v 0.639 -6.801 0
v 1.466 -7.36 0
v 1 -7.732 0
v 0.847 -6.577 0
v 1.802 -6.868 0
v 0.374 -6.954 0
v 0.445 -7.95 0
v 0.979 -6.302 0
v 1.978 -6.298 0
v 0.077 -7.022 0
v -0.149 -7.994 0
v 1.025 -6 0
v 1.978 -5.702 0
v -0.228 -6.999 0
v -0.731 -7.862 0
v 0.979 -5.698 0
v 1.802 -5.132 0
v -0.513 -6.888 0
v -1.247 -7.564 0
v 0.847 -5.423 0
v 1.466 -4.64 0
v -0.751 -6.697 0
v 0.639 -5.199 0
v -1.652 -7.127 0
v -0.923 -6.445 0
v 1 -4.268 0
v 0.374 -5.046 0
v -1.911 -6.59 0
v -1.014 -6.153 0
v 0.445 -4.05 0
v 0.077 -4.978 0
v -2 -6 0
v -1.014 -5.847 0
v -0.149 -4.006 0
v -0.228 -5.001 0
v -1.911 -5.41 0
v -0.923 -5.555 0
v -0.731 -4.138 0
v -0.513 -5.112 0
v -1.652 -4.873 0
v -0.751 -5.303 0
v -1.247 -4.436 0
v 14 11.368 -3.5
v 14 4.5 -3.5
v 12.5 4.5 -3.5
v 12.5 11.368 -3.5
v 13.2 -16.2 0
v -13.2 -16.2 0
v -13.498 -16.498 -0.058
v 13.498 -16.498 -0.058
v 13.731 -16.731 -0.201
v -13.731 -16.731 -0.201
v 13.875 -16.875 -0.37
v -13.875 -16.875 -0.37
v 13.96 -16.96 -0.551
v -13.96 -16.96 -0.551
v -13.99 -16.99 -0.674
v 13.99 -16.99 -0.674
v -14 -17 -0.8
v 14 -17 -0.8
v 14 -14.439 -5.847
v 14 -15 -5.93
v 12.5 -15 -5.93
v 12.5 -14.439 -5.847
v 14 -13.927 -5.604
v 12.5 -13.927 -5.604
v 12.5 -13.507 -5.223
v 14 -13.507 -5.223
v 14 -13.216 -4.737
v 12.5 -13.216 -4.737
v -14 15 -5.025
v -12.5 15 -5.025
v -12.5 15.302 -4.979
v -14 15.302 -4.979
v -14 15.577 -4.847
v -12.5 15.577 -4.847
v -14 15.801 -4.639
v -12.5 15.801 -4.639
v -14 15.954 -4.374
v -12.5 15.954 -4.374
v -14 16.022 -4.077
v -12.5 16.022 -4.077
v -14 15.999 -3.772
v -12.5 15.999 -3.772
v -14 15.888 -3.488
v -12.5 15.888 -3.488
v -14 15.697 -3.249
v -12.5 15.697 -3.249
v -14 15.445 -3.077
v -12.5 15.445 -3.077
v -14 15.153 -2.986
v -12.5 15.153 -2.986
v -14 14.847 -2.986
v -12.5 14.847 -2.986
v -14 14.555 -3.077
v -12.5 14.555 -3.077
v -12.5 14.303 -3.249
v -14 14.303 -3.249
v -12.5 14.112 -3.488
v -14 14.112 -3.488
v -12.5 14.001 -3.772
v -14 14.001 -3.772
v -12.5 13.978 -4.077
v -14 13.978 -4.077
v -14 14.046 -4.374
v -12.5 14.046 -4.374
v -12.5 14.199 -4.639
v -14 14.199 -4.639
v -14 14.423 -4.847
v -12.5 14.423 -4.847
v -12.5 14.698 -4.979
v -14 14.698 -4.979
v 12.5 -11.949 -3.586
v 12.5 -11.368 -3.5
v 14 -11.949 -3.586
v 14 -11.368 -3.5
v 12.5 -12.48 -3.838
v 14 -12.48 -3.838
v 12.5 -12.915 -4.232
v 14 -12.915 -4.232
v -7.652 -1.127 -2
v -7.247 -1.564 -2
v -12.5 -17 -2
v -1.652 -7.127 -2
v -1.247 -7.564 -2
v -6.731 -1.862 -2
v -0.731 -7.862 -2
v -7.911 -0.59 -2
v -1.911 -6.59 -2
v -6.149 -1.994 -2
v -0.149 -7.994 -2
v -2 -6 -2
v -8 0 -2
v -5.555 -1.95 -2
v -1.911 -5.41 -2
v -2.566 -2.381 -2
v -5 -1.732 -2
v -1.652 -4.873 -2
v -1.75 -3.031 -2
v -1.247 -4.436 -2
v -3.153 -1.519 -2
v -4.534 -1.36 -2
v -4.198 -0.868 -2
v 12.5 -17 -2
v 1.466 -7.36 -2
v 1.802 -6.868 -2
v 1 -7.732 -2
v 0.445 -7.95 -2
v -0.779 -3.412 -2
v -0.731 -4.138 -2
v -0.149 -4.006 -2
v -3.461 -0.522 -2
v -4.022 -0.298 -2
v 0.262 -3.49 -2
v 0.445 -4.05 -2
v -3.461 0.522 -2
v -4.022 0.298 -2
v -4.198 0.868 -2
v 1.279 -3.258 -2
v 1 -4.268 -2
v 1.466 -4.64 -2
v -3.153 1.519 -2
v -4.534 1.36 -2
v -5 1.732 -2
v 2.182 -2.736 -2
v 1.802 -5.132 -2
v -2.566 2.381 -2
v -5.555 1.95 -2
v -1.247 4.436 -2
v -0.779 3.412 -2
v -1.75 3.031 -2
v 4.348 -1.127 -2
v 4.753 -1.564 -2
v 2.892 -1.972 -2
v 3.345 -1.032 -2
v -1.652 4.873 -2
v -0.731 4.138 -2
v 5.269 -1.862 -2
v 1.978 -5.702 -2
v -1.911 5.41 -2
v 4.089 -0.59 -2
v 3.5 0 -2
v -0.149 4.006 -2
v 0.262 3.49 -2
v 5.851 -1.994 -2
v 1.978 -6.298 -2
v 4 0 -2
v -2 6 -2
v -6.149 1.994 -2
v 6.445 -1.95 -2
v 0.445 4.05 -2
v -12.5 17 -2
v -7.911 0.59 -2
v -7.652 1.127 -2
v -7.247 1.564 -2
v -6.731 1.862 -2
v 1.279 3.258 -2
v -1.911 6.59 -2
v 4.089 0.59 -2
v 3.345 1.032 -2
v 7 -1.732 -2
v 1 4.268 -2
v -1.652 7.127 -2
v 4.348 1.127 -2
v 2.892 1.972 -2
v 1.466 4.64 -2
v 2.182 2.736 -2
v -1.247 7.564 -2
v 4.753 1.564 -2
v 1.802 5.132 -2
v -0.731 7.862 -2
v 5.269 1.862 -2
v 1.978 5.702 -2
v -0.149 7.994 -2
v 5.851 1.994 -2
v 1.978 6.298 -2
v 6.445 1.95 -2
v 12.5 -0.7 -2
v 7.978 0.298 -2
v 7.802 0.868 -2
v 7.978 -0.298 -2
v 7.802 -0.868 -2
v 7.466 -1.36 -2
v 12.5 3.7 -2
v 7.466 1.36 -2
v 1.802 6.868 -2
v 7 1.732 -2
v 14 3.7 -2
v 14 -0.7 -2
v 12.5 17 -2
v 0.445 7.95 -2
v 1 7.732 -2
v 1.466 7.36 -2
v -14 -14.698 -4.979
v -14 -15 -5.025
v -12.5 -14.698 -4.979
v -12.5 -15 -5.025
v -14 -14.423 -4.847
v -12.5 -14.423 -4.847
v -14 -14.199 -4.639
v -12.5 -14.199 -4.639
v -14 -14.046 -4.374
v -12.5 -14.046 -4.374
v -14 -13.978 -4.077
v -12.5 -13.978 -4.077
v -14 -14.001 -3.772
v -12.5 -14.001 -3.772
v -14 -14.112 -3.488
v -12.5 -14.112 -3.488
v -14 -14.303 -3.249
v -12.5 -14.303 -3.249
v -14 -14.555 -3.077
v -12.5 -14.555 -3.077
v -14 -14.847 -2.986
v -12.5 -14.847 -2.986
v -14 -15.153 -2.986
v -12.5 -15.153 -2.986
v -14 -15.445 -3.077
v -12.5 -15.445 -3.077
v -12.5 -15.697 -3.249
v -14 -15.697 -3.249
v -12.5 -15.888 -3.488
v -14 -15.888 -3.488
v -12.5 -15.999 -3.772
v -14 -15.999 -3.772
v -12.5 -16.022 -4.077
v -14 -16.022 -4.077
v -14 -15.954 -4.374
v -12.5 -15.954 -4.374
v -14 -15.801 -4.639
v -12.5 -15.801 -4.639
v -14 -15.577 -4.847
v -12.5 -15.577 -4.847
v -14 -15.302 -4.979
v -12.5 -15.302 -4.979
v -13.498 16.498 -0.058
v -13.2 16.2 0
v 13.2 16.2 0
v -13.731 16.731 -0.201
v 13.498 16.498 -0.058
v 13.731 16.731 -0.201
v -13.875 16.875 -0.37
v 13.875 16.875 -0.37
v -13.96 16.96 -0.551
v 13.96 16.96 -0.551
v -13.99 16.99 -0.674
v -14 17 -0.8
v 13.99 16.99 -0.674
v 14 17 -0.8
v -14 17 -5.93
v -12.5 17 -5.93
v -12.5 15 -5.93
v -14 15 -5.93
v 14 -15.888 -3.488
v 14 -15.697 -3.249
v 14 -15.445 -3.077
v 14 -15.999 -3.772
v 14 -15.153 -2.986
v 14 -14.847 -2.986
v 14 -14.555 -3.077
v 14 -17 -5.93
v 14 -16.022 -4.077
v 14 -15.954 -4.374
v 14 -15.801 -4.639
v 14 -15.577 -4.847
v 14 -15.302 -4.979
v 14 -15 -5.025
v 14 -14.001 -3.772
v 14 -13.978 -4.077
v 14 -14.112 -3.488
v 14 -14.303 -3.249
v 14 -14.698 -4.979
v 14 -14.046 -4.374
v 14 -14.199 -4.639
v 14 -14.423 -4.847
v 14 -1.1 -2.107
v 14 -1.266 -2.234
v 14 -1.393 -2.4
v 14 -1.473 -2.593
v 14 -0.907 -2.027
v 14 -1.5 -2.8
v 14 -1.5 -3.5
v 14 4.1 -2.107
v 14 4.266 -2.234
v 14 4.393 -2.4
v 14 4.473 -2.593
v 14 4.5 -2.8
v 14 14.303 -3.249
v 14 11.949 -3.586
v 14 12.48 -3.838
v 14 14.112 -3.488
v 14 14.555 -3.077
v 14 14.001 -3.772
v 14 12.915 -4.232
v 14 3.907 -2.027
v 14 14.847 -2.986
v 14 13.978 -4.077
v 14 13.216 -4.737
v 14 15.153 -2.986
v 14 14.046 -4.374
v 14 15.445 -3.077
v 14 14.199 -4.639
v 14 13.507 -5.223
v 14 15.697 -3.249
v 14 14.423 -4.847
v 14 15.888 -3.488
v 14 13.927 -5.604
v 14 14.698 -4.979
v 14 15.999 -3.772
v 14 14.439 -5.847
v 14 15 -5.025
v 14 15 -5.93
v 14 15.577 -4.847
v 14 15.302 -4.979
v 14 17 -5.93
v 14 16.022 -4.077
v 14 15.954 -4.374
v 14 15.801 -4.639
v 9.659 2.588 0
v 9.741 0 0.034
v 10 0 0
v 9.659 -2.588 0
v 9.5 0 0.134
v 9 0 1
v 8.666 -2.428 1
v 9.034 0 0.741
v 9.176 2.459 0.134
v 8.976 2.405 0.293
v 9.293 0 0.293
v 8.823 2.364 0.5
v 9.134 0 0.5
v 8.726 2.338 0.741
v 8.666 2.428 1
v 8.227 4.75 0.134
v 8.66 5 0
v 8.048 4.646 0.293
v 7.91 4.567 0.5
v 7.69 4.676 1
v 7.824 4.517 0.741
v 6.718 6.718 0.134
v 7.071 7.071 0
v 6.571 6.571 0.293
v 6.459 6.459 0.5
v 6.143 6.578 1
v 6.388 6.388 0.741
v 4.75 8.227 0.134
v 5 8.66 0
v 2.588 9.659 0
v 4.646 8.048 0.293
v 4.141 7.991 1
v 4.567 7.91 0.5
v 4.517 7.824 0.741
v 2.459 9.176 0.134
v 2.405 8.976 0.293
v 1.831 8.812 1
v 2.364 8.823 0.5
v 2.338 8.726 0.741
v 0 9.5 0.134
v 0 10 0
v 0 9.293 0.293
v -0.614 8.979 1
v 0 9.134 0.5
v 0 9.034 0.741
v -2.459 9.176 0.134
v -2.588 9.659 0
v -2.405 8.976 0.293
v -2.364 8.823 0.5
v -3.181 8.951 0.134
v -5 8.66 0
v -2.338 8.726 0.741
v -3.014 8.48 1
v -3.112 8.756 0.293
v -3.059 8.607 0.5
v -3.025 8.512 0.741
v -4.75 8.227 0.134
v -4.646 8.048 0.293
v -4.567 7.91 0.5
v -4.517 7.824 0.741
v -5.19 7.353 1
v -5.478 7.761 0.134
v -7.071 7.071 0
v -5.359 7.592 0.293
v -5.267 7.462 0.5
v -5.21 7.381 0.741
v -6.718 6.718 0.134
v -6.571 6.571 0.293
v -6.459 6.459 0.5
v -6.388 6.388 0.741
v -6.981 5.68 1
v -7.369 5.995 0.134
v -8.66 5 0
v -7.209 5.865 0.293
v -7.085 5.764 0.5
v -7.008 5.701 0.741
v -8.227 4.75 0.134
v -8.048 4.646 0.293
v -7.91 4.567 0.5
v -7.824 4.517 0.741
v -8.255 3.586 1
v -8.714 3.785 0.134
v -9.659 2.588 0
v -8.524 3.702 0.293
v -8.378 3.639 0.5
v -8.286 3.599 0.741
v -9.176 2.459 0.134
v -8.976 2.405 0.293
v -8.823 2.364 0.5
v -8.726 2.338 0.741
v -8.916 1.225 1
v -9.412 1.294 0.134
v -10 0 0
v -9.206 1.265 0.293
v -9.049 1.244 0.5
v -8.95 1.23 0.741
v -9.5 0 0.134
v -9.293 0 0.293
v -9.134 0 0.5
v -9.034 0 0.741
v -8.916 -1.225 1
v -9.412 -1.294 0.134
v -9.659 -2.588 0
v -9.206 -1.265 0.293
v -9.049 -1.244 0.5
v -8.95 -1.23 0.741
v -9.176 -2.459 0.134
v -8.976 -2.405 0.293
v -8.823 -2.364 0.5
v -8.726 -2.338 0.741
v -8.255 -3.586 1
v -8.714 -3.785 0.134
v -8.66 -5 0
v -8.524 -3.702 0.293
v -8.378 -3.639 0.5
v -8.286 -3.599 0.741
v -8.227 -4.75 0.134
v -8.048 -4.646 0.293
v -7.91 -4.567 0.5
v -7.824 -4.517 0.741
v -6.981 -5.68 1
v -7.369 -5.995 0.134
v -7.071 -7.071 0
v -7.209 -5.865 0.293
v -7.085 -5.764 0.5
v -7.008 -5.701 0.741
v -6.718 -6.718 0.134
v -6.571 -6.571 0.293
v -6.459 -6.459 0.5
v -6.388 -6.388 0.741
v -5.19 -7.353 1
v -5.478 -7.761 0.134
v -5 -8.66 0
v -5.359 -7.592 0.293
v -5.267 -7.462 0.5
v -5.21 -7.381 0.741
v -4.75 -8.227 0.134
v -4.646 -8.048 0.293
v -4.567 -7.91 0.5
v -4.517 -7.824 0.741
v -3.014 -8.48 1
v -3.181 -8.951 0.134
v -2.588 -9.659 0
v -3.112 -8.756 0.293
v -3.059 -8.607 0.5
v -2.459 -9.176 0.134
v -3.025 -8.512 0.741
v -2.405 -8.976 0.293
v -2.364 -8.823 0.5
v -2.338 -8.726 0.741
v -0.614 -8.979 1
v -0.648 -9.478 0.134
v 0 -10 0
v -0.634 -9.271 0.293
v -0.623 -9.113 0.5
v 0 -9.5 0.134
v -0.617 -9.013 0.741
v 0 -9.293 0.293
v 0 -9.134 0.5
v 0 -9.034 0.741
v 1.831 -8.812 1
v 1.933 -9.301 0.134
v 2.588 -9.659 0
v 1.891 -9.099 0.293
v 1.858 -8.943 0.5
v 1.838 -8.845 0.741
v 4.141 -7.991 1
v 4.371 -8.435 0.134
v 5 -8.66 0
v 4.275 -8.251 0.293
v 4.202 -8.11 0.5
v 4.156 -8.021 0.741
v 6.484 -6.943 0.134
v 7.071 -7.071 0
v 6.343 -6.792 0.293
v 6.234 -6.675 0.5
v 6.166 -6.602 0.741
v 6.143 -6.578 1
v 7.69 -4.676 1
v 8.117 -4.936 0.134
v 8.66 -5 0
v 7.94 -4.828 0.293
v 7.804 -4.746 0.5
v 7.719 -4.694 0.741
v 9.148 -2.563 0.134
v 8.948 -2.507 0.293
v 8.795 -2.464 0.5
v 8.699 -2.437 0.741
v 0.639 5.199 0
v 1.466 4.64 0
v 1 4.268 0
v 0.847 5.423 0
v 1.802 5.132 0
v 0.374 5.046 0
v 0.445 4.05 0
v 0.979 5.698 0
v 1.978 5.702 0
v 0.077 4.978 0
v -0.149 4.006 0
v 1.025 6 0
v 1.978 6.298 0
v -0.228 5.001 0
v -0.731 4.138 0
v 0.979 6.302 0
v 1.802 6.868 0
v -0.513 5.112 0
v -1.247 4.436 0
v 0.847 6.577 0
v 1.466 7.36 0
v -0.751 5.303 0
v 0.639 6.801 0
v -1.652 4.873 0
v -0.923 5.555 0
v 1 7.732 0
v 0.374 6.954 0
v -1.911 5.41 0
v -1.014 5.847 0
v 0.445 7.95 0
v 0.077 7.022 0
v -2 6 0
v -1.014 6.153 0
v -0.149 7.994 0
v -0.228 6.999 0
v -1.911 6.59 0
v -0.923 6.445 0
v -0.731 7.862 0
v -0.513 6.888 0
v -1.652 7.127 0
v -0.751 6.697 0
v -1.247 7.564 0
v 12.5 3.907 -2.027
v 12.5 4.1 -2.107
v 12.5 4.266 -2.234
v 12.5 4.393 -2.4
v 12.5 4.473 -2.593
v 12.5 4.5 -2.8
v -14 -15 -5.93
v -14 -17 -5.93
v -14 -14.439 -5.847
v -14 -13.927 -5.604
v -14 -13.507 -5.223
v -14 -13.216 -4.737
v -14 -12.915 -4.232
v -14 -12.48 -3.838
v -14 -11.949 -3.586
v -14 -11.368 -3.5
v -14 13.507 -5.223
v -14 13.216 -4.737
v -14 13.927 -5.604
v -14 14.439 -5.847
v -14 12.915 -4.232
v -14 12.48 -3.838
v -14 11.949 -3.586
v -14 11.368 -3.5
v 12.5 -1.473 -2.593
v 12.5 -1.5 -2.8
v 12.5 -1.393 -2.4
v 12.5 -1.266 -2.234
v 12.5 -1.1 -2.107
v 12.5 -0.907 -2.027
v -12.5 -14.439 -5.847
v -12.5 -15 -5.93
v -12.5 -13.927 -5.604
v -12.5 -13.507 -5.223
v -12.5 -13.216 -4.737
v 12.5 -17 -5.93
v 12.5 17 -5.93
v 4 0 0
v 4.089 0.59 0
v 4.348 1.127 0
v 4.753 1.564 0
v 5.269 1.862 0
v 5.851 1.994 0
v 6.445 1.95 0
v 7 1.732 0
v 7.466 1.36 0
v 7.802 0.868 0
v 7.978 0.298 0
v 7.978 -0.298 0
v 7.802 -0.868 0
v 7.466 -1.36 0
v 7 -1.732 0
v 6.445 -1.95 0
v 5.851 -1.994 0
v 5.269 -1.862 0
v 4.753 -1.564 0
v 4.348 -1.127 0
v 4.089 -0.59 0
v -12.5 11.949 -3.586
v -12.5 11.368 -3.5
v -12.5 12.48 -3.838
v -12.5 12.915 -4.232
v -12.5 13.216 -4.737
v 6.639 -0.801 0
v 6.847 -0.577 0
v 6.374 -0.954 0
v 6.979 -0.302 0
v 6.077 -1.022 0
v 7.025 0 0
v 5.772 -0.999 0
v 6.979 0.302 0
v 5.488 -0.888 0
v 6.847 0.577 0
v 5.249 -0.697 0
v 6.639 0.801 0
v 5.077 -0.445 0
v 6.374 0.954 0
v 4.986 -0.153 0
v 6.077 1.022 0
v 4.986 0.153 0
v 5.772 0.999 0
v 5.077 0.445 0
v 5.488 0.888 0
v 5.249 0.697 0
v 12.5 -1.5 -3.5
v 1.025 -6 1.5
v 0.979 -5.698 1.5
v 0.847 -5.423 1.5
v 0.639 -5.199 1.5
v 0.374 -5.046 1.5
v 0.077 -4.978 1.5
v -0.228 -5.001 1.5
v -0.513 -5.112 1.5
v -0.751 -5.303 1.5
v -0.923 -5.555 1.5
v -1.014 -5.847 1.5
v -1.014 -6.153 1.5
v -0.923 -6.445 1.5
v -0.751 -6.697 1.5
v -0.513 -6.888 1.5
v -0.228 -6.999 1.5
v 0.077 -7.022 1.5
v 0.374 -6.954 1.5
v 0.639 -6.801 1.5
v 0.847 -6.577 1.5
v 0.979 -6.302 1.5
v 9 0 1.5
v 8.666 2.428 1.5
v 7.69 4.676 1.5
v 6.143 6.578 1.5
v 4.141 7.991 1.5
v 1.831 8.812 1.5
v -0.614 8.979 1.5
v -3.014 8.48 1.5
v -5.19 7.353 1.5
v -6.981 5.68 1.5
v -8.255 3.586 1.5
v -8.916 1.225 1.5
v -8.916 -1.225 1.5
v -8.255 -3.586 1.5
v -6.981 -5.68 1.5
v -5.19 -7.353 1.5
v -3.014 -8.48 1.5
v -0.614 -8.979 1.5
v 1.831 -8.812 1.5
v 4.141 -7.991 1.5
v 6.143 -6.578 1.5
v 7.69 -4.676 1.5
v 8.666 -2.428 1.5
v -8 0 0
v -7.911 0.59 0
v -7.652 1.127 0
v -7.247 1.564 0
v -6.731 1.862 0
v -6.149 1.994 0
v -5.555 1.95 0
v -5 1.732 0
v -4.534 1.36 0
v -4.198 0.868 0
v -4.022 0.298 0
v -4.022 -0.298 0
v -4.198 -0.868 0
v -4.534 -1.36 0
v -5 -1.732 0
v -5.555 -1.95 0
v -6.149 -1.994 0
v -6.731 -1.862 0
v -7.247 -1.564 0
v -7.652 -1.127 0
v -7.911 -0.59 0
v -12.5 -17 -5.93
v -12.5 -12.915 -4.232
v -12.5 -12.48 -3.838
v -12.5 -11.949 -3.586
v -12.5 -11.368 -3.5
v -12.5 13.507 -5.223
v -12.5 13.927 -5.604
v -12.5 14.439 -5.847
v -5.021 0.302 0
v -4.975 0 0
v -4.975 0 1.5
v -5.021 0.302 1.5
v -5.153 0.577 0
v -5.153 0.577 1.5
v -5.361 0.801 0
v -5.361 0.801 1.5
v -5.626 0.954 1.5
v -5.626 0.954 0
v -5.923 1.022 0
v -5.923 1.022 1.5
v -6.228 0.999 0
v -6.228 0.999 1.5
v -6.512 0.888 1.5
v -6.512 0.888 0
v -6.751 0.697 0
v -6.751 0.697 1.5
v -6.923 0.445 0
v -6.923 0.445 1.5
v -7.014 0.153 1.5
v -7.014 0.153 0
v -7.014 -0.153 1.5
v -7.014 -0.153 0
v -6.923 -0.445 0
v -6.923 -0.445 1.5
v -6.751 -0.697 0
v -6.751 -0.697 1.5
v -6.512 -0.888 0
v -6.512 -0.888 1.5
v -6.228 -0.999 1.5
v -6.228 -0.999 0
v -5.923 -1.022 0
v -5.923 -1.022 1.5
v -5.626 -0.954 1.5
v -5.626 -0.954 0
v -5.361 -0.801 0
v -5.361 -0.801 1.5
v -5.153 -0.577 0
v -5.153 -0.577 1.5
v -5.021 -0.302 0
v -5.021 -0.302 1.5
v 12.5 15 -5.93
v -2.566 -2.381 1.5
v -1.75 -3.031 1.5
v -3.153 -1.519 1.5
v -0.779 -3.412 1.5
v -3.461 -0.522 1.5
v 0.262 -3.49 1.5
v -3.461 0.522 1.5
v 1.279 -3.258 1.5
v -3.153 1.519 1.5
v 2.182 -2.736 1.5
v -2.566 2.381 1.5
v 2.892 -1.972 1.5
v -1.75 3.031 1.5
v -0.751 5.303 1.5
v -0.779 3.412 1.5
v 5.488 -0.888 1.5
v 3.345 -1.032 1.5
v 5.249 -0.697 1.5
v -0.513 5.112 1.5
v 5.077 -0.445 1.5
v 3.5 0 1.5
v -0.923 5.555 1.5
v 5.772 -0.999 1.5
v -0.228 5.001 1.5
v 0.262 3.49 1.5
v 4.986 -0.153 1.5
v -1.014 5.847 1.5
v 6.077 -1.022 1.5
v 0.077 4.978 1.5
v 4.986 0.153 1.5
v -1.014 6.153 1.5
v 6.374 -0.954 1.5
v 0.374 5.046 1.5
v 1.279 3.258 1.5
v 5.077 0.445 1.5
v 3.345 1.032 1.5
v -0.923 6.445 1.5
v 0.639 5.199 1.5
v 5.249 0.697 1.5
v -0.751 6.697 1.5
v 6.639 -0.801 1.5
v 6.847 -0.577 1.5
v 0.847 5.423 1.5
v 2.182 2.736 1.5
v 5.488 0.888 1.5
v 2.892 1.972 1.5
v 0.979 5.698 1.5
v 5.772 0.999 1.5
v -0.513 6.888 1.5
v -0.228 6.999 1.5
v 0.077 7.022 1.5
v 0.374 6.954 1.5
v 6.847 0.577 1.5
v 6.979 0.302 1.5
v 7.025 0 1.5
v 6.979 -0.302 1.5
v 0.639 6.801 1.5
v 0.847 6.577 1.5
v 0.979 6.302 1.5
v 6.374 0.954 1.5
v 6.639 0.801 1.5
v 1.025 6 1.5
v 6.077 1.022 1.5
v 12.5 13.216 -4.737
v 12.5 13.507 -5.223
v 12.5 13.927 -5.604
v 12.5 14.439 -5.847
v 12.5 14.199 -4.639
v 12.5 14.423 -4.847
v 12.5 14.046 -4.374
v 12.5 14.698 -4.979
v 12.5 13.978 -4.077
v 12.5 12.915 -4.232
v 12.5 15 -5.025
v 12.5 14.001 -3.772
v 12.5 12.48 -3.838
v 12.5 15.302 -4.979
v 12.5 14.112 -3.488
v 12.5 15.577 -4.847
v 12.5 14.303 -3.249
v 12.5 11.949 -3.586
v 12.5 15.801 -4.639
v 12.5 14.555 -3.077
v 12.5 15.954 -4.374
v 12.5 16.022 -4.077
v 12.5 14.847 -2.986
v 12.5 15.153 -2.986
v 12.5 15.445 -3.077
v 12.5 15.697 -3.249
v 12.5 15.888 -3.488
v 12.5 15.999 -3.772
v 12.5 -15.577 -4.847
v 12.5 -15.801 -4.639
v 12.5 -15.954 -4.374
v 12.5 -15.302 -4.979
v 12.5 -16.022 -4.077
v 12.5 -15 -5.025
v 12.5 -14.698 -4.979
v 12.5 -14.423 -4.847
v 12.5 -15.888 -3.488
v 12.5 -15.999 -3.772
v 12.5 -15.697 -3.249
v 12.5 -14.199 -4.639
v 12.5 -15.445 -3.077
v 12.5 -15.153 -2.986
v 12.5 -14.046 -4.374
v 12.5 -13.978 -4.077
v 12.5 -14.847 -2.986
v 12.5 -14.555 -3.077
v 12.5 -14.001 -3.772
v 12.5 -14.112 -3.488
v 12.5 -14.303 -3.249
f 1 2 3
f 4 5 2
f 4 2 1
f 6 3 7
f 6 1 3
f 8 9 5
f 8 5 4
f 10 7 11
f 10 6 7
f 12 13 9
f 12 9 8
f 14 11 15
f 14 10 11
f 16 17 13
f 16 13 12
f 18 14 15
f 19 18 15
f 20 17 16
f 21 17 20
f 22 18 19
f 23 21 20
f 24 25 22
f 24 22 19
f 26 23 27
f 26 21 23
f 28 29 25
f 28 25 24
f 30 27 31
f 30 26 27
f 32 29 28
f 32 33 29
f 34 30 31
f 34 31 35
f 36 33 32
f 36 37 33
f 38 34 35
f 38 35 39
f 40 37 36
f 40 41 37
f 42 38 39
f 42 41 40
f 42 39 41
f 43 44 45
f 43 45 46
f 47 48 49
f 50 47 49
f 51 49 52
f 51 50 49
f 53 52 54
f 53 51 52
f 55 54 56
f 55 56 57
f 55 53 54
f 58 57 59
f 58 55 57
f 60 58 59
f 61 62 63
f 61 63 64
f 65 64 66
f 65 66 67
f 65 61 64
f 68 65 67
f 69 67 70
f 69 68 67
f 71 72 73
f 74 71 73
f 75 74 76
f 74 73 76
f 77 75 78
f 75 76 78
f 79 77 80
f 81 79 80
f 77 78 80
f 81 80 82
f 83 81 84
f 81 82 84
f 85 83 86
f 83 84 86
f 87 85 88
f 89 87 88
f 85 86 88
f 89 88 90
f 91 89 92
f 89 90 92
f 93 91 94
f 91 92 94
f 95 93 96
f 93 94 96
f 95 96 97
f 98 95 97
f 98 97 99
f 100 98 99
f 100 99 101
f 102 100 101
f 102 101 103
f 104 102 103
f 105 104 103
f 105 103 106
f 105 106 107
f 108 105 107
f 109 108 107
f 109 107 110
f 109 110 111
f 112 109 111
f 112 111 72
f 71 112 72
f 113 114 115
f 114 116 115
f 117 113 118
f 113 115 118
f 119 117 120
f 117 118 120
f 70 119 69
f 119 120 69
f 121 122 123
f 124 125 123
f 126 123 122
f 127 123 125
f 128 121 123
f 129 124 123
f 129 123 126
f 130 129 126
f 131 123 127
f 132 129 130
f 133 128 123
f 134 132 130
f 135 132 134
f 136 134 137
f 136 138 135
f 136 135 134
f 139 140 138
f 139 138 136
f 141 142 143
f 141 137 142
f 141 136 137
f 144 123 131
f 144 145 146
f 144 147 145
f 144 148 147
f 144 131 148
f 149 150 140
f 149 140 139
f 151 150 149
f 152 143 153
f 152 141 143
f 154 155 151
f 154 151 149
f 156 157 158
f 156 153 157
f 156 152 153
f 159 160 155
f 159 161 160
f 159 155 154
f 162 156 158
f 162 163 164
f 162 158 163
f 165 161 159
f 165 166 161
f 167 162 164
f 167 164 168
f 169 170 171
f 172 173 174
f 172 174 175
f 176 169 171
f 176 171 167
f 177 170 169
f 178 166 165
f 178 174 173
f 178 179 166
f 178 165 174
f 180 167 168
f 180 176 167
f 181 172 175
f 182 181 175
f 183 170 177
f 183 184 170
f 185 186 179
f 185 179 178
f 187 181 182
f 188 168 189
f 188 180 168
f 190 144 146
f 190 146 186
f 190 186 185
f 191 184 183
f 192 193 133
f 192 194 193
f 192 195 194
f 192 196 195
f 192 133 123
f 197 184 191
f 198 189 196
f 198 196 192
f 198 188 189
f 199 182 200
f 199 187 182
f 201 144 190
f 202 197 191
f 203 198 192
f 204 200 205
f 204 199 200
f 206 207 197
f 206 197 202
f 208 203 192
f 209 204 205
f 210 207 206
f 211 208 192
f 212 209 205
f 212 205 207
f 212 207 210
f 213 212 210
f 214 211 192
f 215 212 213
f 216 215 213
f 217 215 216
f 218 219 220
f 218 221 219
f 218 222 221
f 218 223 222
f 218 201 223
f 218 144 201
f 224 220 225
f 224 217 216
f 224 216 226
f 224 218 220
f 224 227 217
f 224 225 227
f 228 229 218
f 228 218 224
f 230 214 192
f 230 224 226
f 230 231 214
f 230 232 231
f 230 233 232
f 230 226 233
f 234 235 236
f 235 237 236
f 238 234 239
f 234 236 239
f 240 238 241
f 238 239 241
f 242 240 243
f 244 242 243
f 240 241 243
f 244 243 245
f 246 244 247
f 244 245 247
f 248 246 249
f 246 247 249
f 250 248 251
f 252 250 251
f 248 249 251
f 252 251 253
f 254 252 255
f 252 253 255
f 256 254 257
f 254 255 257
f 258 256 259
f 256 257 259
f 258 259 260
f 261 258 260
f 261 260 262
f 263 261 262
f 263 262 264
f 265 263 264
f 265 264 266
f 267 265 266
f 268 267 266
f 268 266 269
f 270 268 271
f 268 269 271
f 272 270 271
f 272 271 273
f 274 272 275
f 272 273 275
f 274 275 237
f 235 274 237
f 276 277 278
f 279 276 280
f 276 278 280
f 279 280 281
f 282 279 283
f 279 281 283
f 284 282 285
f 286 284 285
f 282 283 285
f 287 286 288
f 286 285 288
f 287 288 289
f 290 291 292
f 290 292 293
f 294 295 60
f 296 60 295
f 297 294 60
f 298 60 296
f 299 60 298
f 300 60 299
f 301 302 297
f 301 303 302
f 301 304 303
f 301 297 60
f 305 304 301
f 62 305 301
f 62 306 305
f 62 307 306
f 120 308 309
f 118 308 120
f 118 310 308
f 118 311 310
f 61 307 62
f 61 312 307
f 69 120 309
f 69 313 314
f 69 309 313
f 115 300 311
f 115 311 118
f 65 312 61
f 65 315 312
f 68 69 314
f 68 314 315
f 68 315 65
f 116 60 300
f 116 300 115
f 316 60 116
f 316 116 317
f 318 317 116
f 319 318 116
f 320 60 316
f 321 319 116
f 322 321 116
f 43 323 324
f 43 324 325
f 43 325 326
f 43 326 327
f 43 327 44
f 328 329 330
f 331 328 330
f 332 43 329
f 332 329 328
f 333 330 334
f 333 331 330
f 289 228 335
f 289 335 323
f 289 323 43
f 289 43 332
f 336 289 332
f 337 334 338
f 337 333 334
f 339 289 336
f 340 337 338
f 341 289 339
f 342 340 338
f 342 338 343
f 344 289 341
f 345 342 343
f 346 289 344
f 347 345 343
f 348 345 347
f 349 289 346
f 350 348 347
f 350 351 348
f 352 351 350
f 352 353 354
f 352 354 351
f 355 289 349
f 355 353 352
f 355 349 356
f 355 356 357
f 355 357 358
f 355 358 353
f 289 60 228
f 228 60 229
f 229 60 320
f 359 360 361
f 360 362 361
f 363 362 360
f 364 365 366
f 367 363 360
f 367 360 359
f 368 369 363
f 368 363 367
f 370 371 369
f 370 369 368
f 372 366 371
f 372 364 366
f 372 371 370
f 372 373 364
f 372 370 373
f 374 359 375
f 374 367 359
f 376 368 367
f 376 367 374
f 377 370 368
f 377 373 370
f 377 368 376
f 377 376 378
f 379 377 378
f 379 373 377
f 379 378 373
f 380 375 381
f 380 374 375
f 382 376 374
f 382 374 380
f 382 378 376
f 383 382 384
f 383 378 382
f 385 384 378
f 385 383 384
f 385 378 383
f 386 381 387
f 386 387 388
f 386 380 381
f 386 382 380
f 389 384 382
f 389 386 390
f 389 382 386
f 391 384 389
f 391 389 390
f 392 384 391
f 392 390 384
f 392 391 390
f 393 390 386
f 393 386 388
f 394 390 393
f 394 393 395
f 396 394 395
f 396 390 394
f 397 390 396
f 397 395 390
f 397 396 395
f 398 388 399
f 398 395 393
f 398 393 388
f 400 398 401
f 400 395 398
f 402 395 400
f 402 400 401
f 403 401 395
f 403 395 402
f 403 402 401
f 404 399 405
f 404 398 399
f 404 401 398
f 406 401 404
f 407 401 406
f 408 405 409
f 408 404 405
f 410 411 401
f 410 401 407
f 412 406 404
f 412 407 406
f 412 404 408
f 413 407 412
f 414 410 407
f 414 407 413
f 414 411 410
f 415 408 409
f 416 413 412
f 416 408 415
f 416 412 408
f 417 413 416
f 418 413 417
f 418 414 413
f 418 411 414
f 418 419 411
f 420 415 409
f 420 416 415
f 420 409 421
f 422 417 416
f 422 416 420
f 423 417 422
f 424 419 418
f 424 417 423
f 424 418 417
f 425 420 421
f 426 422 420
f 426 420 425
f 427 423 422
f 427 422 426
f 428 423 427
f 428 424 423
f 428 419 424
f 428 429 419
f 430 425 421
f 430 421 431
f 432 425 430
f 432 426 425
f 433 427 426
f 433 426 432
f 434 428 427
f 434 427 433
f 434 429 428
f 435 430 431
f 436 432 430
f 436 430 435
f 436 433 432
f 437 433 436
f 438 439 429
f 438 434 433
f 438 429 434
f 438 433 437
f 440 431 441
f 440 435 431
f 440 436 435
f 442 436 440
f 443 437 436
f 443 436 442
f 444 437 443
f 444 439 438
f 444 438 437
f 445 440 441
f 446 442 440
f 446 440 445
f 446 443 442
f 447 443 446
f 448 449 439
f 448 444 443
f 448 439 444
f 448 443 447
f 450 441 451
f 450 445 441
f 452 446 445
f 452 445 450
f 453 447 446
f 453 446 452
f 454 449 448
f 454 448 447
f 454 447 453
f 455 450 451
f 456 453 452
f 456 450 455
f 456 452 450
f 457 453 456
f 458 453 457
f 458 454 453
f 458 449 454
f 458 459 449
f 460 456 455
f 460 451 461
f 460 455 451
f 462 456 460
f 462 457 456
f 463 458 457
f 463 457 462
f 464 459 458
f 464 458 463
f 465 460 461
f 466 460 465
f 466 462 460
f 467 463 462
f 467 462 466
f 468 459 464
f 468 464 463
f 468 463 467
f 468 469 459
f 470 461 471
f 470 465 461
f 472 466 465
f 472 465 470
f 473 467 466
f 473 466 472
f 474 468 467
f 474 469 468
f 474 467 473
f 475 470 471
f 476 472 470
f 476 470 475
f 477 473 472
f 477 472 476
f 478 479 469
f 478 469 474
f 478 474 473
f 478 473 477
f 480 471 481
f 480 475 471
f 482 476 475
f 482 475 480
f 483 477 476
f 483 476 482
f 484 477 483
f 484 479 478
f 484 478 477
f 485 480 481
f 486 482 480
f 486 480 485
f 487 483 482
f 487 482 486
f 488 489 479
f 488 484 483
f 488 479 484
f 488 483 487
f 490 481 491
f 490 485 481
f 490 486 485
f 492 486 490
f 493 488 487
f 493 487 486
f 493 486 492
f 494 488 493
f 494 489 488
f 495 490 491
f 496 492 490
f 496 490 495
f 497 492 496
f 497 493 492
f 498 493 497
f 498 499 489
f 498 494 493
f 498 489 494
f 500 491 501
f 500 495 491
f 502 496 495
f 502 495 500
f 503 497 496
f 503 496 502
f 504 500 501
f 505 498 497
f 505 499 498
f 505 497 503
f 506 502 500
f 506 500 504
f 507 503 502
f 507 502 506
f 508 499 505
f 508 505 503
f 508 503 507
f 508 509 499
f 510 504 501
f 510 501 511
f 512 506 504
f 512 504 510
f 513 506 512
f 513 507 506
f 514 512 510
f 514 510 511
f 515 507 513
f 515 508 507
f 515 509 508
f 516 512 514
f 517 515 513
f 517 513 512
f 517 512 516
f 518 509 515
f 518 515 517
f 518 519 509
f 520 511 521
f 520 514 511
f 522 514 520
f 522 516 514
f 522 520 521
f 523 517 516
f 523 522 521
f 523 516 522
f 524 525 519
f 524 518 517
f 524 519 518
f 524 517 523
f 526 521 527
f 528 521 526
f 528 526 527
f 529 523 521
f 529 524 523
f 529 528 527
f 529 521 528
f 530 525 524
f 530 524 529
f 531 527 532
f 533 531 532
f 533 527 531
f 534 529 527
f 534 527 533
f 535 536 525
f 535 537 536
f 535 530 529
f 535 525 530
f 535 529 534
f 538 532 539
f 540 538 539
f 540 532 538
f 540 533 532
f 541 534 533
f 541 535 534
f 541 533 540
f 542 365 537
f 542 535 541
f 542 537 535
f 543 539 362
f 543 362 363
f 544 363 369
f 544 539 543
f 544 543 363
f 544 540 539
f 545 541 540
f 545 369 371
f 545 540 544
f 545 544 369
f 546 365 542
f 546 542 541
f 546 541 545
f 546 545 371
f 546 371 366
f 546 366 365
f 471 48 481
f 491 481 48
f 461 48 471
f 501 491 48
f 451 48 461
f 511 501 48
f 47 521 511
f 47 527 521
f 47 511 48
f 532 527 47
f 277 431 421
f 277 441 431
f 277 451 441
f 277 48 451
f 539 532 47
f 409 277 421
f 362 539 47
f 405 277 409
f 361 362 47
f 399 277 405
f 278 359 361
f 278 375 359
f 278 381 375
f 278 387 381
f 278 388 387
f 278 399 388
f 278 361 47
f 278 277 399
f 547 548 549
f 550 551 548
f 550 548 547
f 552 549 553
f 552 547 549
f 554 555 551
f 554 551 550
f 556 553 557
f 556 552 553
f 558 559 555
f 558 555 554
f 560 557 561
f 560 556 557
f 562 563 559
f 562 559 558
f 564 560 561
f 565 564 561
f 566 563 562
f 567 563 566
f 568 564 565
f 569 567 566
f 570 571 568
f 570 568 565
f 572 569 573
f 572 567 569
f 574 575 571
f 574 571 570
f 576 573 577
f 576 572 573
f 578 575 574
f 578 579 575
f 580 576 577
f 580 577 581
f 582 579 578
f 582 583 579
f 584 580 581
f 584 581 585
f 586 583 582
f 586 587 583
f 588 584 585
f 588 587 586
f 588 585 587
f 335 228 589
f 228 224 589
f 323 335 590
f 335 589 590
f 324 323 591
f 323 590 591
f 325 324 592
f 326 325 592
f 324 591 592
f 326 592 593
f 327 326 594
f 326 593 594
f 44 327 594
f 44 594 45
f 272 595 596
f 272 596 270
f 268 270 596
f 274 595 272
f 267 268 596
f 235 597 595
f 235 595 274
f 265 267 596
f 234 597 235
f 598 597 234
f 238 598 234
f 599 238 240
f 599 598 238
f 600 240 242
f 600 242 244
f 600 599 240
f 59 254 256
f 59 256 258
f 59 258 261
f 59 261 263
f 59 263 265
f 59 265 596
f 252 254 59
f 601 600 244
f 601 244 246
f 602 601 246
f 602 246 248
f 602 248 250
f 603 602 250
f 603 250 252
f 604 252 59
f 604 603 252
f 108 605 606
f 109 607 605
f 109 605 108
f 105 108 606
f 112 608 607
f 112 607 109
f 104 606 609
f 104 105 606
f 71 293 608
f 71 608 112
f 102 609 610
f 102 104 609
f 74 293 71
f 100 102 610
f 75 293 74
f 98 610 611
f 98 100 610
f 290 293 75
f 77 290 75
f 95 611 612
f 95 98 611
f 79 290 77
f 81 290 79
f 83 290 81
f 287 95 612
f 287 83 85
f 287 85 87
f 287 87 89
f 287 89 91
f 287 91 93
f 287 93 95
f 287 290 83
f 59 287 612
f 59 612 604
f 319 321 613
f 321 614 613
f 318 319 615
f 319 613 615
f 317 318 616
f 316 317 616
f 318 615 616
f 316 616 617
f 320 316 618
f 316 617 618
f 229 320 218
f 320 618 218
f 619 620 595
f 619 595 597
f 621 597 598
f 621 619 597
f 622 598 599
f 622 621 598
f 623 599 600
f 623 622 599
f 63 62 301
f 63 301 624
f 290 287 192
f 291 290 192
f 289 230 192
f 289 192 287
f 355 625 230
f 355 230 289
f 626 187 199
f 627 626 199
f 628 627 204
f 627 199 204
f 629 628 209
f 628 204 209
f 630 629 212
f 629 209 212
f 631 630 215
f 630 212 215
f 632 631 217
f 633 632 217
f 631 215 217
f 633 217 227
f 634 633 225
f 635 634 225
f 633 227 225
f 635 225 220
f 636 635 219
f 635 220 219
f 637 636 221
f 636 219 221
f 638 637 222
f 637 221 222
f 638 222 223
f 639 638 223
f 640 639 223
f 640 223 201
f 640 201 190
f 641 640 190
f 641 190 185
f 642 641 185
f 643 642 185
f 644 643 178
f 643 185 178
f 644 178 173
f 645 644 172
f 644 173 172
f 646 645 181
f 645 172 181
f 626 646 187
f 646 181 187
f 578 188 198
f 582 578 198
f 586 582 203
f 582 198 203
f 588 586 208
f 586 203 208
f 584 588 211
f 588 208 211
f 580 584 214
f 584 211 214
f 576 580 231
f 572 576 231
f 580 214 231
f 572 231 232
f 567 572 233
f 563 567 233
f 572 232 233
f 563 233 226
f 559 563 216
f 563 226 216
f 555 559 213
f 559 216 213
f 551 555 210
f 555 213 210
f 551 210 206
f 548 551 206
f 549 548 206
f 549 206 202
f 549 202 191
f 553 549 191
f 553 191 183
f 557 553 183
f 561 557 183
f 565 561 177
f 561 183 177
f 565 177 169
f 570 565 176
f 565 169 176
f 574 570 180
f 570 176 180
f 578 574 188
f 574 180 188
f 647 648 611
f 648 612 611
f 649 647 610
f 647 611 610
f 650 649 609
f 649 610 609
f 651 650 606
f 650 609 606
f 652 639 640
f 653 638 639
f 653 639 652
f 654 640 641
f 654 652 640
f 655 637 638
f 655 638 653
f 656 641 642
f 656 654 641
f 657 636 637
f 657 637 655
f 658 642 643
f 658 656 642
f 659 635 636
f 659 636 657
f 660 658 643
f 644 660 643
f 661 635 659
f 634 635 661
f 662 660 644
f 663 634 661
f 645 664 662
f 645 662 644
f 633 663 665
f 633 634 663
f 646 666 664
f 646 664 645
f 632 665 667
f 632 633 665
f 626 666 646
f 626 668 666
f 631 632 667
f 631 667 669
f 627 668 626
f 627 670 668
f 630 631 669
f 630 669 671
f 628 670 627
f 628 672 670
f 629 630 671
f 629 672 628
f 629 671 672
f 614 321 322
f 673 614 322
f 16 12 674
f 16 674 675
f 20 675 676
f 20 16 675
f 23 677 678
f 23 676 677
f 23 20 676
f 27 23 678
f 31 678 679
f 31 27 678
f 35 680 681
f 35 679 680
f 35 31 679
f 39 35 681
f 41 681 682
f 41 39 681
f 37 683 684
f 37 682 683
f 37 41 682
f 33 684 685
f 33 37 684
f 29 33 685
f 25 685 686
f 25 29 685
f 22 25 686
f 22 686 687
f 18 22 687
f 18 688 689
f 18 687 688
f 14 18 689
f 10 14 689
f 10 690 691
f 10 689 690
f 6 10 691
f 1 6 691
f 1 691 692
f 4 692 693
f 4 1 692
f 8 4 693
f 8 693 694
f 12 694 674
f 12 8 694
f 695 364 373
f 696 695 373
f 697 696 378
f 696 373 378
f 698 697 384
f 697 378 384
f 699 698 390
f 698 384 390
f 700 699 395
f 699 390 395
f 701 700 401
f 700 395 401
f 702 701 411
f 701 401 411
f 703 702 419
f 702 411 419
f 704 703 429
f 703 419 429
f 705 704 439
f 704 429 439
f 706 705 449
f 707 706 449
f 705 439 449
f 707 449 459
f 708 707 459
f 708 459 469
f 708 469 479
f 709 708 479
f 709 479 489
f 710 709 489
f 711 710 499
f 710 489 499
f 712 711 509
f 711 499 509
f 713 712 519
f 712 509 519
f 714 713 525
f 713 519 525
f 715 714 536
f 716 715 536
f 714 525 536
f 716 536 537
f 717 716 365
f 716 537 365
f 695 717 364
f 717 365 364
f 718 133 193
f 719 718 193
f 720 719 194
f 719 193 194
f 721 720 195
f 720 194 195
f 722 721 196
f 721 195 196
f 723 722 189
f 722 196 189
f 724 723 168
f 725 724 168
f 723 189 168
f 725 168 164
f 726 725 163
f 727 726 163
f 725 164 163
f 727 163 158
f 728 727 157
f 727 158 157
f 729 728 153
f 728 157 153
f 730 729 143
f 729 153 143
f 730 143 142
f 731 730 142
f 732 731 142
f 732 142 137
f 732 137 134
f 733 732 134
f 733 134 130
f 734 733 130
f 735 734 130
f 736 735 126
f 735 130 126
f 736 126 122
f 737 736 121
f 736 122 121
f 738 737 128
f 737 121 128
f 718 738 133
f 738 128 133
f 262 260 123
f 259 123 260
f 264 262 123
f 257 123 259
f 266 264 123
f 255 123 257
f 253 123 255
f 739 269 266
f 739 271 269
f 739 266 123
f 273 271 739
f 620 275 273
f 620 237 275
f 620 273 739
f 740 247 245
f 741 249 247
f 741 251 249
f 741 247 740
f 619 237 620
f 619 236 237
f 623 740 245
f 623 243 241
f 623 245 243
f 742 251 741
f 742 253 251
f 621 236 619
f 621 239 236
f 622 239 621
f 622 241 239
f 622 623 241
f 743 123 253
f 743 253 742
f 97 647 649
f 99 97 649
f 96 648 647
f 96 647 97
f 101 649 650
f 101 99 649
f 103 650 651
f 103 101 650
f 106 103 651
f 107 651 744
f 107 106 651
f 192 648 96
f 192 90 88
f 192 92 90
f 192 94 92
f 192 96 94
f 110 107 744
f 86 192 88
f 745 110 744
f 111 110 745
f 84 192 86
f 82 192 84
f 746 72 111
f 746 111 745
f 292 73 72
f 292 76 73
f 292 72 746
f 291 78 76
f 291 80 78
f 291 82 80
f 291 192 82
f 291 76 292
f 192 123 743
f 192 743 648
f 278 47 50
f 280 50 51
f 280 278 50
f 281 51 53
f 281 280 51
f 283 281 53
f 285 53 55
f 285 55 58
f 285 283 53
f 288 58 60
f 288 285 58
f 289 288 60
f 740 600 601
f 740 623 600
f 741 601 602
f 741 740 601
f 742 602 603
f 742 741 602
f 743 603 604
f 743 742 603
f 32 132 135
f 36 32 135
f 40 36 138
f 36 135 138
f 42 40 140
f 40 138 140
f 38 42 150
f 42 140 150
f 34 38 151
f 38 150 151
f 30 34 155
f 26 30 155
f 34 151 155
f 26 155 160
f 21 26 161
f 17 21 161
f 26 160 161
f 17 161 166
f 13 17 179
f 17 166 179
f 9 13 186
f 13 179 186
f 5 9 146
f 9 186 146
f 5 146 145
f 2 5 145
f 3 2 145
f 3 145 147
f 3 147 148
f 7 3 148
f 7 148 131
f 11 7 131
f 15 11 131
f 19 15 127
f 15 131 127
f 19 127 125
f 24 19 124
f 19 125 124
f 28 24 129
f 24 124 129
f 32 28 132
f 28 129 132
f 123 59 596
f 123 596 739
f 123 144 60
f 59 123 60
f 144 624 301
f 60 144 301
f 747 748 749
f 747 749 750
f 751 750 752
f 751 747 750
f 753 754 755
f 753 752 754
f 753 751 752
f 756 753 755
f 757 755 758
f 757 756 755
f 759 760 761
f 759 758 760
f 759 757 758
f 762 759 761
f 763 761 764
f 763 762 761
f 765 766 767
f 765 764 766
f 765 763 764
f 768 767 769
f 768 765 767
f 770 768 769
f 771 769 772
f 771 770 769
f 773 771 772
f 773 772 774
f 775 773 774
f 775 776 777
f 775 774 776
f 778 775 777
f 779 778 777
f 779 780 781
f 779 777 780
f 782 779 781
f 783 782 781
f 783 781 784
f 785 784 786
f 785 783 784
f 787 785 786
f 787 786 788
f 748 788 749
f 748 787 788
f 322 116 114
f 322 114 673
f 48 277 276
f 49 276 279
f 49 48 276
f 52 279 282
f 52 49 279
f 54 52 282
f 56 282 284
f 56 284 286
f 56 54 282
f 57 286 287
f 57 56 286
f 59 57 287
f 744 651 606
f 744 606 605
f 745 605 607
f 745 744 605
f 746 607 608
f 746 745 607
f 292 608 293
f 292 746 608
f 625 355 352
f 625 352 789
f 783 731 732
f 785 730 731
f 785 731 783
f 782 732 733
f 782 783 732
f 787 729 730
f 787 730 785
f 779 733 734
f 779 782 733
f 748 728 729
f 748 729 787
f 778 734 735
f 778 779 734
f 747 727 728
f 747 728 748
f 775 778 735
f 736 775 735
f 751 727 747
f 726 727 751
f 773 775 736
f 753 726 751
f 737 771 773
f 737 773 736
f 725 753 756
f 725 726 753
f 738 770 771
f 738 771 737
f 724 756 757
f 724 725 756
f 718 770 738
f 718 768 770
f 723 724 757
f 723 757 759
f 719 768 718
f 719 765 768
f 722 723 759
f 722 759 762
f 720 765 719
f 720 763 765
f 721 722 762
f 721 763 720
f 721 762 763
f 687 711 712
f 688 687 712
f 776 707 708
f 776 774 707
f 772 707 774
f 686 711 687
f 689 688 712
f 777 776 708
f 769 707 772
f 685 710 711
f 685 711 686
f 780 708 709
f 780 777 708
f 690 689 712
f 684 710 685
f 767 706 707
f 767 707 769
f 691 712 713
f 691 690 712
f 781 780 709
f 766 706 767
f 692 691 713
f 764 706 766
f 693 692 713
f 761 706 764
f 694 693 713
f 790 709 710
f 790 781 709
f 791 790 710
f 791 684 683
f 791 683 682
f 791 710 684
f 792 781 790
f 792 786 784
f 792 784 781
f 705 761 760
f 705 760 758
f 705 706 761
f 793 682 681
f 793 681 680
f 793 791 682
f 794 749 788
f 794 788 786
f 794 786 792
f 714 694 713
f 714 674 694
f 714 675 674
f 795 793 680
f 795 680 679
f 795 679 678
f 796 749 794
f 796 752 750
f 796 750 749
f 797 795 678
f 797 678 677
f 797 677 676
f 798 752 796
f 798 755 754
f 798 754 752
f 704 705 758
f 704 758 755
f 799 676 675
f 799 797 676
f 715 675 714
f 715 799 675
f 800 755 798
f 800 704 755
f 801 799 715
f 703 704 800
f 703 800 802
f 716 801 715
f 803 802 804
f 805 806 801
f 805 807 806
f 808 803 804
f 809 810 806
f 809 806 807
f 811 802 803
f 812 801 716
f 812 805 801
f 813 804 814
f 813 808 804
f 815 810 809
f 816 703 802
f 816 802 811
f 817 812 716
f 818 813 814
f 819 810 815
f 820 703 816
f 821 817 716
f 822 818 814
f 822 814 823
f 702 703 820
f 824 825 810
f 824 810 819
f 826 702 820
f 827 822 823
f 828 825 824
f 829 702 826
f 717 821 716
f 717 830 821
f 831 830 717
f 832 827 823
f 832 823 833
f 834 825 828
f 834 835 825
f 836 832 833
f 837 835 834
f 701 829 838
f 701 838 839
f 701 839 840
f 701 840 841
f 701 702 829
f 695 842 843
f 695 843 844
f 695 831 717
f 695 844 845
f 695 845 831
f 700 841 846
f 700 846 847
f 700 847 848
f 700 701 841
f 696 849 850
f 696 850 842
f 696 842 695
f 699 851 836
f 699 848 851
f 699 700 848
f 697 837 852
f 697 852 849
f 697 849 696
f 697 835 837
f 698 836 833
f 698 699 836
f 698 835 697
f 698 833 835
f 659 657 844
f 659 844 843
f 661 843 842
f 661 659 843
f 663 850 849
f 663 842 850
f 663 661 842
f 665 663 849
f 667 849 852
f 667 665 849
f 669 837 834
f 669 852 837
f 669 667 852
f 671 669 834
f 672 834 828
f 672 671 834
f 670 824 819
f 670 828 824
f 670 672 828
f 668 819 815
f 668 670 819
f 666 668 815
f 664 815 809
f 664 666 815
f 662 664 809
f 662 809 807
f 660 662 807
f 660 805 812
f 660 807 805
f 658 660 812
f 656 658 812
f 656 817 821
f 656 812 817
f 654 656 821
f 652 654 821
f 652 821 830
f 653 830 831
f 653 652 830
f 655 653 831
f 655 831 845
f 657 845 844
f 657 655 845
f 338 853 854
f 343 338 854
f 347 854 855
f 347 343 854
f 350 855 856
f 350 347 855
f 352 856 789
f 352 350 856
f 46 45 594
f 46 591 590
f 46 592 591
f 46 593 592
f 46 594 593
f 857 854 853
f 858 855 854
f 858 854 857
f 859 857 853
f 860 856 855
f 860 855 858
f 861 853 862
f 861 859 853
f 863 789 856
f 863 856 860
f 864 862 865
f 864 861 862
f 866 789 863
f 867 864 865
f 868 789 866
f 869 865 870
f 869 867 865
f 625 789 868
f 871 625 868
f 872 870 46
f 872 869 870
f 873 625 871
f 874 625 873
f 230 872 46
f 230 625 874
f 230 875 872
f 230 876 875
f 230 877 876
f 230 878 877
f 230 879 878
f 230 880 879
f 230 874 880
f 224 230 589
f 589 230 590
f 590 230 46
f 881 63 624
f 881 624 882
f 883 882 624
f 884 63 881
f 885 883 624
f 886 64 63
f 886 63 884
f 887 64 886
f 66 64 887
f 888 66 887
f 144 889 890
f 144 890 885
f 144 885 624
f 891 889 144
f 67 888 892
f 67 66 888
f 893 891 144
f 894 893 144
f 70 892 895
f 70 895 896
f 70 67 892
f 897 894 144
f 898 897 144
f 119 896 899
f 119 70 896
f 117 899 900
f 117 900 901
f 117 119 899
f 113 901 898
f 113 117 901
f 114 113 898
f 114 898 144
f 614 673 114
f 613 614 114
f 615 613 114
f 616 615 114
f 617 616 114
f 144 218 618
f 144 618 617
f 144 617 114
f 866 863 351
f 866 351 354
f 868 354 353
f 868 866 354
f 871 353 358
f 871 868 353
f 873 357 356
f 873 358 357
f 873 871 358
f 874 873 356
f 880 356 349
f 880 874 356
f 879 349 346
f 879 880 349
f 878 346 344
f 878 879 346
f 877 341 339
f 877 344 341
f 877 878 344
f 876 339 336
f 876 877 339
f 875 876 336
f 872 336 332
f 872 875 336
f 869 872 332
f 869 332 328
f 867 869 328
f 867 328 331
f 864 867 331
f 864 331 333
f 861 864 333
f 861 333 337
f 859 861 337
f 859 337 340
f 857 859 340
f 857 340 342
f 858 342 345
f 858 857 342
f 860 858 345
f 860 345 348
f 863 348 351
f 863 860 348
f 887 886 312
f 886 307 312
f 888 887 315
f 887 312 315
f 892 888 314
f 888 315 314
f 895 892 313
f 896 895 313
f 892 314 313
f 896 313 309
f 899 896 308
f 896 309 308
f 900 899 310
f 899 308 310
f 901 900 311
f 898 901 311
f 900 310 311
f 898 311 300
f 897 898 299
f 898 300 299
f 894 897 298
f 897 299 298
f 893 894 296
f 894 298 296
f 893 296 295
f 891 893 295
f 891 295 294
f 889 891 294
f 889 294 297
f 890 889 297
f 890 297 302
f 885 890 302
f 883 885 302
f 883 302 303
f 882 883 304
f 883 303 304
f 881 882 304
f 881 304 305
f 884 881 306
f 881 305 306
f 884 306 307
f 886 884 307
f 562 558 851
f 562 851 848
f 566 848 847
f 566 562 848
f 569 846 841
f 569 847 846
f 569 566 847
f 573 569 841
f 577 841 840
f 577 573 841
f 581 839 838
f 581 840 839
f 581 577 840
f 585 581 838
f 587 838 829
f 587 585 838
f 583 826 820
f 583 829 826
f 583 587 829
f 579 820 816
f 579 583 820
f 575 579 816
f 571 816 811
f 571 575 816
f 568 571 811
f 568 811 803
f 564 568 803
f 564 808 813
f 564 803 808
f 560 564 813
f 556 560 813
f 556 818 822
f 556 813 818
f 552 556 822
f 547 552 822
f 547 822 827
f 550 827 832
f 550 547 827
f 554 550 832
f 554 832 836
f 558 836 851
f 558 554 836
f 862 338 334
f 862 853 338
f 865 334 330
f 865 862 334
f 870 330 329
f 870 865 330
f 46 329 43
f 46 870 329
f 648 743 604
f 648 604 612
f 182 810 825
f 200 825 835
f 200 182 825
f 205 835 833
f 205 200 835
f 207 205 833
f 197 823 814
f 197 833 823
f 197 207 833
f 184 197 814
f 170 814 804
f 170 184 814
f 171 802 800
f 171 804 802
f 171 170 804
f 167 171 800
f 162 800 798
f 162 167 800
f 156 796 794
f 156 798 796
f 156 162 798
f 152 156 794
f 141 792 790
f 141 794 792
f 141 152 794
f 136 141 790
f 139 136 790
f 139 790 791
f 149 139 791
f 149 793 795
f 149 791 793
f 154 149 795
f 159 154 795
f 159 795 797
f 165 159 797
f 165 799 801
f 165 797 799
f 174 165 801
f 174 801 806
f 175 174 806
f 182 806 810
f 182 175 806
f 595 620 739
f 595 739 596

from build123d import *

# Parameters (mm, degrees)
BOSS_EXTRUDE1_DEPTH = 17
SKETCH2_R           = 1.025
CUT_EXTRUDE1_DEPTH  = 50
CUT_EXTRUDE2_DEPTH  = 50
FILLET1_R           = 2
SKETCH8_W           = 1.5
SKETCH8_H           = 6
CUT_EXTRUDE5_DEPTH  = 10
SKETCH9_R           = 9
BOSS_EXTRUDE2_DEPTH = 1.5
SKETCH7_R           = 3.5
SKETCH7_R_2         = 1.025
CUT_EXTRUDE6_DEPTH  = 10
SKETCH10_R          = 2
CUT_EXTRUDE7_DEPTH  = 2
FILLET2_R           = 1
FILLET3_R           = 0.8
FILLET4_R           = 0.8


with BuildPart() as part:
    # Sketch1 → Boss-Extrude1 (new body, symmetric)
    with BuildSketch(Plane(origin=(0, 0, 0), x_dir=(1, 0, 0), z_dir=(0, 1, 0))):
        Polygon((-14, 0), (14, 0), (14, 5.93), (12.5, 5.93), (12.5, 2), (-12.5, 2), (-12.5, 5.93), (-14, 5.93), align=None)
    extrude(amount=BOSS_EXTRUDE1_DEPTH, both=True)

    # Sketch2 → Cut-Extrude1 (cut, symmetric)
    with BuildSketch(Plane(origin=(-12.5, 0, 0), x_dir=(0, 0, -1), z_dir=(1, 0, 0))):
        with Locations((4, 15)):
            Circle(SKETCH2_R)
        with Locations((4, -15)):
            Circle(SKETCH2_R)
    extrude(amount=CUT_EXTRUDE1_DEPTH, both=True, mode=Mode.SUBTRACT)

    # Sketch3 → Cut-Extrude2 (cut, symmetric)
    with BuildSketch(Plane(origin=(14, 0, 0), x_dir=(0, 0, -1), z_dir=(1, 0, 0))):
        with BuildLine():
            Line((3.5, -13.135891634), (3.5, 13.135891634))
            ThreePointArc((3.5, 13.135891634), (5.174712731, 13.468677043), (5.93, 15))
            Line((5.93, 15), (5.93, -15))
            ThreePointArc((5.93, -15), (5.174712731, -13.468677043), (3.5, -13.135891634))
        make_face()
    extrude(amount=CUT_EXTRUDE2_DEPTH, both=True, mode=Mode.SUBTRACT)

    # Fillet1
    fillet1_edges = [part.edges().sort_by_distance(p)[0] for p in [
        (13.25, 13.135891634, -3.5),
        (-13.25, 13.135891634, -3.5),
        (13.25, -13.135891634, -3.5),
        (-13.25, -13.135891634, -3.5),
    ]]
    fillet(fillet1_edges, radius=FILLET1_R)

    # Sketch8 → Cut-Extrude5 (cut)
    with BuildSketch(Plane(origin=(14, 0, 0), x_dir=(0, 0, -1), z_dir=(1, 0, 0))):
        with Locations((2.75, 1.5)):
            Rectangle(SKETCH8_W, SKETCH8_H)
    extrude(amount=-CUT_EXTRUDE5_DEPTH, mode=Mode.SUBTRACT)

    # Sketch9 → Boss-Extrude2 (add)
    with BuildSketch(Plane.XY):
        Circle(SKETCH9_R)
    extrude(amount=BOSS_EXTRUDE2_DEPTH)

    # Sketch7 → Cut-Extrude6 (cut)
    with BuildSketch(Plane.XY.offset(-2)):
        Circle(SKETCH7_R)
        with Locations((0, 6)):
            Circle(SKETCH7_R_2)
        with Locations((0, -6)):
            Circle(SKETCH7_R_2)
        with Locations((6, 0)):
            Circle(SKETCH7_R_2)
        with Locations((-6, 0)):
            Circle(SKETCH7_R_2)
    extrude(amount=CUT_EXTRUDE6_DEPTH, mode=Mode.SUBTRACT)

    # Sketch10 → Cut-Extrude7 (cut)
    with BuildSketch(Plane(origin=(0, 0, -2), x_dir=(-1, 0, 0), z_dir=(0, 0, -1))):
        with Locations((0, 6)):
            Circle(SKETCH10_R)
        with Locations((-6, 0)):
            Circle(SKETCH10_R)
        with Locations((0, -6)):
            Circle(SKETCH10_R)
        with Locations((6, 0)):
            Circle(SKETCH10_R)
    extrude(amount=-CUT_EXTRUDE7_DEPTH, mode=Mode.SUBTRACT)

    # Fillet2
    fillet2_edges = [part.edges().sort_by_distance(p)[0] for p in [
        (-9, 0, 0),
    ]]
    fillet(fillet2_edges, radius=FILLET2_R)

    # Fillet3
    fillet3_edges = [part.edges().sort_by_distance(p)[0] for p in [
        (14, 0, 0),
        (-14, 0, 0),
        (0, 17, 0),
        (0, -17, 0),
    ]]
    fillet(fillet3_edges, radius=FILLET3_R)

    # Fillet4
    fillet4_edges = [part.edges().sort_by_distance(p)[0] for p in [
        (13.25, -1.5, -2),
        (13.25, 4.5, -2),
    ]]
    fillet(fillet4_edges, radius=FILLET4_R)


solid = part.part
